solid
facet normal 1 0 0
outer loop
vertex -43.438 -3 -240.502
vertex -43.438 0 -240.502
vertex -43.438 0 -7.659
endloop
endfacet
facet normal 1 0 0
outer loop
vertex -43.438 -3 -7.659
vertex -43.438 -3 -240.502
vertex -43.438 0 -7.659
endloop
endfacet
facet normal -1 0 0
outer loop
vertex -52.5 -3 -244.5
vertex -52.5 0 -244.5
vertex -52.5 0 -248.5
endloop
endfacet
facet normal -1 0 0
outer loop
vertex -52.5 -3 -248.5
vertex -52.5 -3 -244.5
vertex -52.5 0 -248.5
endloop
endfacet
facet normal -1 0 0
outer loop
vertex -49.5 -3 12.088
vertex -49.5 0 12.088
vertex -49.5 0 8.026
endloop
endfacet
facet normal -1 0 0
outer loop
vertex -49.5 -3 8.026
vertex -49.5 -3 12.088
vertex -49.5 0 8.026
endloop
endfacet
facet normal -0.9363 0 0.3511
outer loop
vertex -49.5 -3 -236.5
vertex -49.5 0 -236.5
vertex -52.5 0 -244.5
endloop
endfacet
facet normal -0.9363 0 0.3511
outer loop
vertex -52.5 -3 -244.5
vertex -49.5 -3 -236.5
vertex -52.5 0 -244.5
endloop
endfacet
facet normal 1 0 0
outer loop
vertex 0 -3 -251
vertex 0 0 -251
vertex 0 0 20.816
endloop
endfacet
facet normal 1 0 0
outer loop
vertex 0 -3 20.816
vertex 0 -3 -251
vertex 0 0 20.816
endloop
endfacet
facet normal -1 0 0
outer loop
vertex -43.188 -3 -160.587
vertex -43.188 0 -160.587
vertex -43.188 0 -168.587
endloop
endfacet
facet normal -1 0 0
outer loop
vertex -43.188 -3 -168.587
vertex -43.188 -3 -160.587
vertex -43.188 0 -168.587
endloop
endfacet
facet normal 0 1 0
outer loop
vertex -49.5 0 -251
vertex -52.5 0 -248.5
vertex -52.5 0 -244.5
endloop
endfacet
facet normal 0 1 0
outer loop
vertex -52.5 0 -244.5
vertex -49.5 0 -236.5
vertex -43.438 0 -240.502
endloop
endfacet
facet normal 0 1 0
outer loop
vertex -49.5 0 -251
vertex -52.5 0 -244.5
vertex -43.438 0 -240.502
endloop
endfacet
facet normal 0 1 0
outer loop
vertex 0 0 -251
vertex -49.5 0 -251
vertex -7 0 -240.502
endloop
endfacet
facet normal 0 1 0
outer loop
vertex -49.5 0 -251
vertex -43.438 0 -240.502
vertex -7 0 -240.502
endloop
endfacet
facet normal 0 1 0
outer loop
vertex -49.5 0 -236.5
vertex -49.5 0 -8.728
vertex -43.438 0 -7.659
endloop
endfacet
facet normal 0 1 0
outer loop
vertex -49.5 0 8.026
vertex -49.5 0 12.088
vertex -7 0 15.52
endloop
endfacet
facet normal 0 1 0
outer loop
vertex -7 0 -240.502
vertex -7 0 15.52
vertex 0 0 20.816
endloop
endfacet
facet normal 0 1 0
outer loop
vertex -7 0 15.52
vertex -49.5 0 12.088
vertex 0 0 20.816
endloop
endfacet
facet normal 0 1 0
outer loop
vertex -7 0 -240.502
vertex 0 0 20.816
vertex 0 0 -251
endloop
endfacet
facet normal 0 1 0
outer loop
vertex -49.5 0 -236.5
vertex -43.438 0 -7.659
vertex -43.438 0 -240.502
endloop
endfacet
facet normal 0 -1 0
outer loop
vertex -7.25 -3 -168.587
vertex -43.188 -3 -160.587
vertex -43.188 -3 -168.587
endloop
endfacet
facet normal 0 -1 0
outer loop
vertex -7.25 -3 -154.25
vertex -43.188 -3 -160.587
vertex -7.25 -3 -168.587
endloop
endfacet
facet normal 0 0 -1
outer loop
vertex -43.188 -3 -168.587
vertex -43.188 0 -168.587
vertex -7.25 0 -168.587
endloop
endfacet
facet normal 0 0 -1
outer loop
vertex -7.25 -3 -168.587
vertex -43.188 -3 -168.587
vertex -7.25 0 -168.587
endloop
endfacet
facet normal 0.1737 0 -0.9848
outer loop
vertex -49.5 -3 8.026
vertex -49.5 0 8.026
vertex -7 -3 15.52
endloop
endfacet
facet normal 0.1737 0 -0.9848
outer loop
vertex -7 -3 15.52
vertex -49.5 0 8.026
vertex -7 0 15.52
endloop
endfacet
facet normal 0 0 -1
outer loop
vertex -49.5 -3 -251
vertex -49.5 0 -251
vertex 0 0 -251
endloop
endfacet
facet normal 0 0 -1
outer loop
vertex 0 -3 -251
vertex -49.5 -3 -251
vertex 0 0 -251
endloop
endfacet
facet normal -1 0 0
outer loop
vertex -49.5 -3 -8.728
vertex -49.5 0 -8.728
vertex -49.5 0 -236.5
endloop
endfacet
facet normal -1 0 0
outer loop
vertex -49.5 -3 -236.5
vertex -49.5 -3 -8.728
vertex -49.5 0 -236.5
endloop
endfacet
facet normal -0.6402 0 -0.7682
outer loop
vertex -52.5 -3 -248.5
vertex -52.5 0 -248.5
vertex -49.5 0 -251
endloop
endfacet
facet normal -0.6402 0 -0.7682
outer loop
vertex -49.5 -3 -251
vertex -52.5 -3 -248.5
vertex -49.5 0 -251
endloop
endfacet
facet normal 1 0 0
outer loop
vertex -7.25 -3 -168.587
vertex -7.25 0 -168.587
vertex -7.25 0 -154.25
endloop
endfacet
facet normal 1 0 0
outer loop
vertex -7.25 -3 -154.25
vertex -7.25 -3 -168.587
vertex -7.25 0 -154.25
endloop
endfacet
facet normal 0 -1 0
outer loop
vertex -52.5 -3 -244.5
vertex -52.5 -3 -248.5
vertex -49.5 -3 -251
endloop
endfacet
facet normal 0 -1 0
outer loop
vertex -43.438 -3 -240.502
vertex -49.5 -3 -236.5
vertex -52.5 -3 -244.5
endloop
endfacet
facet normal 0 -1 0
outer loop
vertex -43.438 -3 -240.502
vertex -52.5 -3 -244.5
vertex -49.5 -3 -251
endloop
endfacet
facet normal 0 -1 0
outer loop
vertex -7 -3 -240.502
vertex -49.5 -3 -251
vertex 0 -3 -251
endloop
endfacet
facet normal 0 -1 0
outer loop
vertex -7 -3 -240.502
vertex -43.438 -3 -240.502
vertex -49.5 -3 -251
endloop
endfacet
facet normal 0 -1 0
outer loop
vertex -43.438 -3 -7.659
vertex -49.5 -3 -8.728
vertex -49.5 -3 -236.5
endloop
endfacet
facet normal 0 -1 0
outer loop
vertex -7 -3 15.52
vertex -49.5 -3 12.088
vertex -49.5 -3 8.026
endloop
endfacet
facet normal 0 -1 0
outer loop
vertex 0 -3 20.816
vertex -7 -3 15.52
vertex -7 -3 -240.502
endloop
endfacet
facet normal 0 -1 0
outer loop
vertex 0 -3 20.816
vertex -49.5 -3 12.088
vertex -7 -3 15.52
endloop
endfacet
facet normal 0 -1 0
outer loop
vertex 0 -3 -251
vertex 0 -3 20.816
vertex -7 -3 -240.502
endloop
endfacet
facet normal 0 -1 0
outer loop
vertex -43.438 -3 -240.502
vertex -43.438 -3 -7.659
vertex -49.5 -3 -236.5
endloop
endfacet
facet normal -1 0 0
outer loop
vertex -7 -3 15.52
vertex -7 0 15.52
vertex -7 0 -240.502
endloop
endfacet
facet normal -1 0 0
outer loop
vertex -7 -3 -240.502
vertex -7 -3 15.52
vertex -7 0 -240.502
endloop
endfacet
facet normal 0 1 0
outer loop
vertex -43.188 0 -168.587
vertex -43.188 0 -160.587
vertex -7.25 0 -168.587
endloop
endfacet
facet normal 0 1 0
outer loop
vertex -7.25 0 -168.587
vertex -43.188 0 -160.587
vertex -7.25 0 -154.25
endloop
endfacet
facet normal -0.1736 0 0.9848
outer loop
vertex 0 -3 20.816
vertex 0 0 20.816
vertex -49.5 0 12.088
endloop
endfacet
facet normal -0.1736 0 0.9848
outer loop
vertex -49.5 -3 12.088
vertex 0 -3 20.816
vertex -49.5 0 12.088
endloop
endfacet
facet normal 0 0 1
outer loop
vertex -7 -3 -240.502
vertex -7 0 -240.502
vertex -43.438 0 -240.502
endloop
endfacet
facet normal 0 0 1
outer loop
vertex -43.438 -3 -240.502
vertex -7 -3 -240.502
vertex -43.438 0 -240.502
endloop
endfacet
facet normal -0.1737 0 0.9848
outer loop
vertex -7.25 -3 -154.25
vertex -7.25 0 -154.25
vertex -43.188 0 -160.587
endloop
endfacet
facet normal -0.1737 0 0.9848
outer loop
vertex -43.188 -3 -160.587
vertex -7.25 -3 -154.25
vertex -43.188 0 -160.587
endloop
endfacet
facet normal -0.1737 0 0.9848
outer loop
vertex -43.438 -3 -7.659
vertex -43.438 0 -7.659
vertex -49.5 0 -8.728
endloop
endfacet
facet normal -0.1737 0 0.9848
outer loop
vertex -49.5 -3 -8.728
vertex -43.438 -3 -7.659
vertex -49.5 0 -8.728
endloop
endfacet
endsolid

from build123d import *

# Parameters (mm, degrees)
F1_DEPTH = 3
F2_DEPTH = 3


# Not quite as in the source:
# - a feature names something its author has since deleted; it is built from what else it names


with BuildPart() as f1:
    # F0 (on Front) → F1 (new body)
    with BuildSketch(Plane.XZ):
        Polygon((-43.1878868615, -160.5870006293), (-43.1878868615, -168.5870006293), (-7.25, -168.5870006293), (-7.25, -154.250181546), align=None)
    extrude(amount=F1_DEPTH)


with BuildPart() as f2:
    # F0 (on Front) → F2 (new body)
    with BuildSketch(Plane.XZ):
        Polygon((-49.5, -251), (0, -251), (0, 0), (0, 20.8162455437), (-49.5, 12.0880599986), (-49.5, 8.026353551), (-7, 15.5202502312), (-7, -1.234288865), (-7, -240.5024516791), (-43.4378868615, -240.5024516791), (-43.4378868615, -7.6592714386), (-49.5, -8.7281855451), (-49.5, -236.5), (-52.5, -244.5), (-52.5, -248.5), align=None)
    extrude(amount=F2_DEPTH)


solid = Compound([f1.part, f2.part])
